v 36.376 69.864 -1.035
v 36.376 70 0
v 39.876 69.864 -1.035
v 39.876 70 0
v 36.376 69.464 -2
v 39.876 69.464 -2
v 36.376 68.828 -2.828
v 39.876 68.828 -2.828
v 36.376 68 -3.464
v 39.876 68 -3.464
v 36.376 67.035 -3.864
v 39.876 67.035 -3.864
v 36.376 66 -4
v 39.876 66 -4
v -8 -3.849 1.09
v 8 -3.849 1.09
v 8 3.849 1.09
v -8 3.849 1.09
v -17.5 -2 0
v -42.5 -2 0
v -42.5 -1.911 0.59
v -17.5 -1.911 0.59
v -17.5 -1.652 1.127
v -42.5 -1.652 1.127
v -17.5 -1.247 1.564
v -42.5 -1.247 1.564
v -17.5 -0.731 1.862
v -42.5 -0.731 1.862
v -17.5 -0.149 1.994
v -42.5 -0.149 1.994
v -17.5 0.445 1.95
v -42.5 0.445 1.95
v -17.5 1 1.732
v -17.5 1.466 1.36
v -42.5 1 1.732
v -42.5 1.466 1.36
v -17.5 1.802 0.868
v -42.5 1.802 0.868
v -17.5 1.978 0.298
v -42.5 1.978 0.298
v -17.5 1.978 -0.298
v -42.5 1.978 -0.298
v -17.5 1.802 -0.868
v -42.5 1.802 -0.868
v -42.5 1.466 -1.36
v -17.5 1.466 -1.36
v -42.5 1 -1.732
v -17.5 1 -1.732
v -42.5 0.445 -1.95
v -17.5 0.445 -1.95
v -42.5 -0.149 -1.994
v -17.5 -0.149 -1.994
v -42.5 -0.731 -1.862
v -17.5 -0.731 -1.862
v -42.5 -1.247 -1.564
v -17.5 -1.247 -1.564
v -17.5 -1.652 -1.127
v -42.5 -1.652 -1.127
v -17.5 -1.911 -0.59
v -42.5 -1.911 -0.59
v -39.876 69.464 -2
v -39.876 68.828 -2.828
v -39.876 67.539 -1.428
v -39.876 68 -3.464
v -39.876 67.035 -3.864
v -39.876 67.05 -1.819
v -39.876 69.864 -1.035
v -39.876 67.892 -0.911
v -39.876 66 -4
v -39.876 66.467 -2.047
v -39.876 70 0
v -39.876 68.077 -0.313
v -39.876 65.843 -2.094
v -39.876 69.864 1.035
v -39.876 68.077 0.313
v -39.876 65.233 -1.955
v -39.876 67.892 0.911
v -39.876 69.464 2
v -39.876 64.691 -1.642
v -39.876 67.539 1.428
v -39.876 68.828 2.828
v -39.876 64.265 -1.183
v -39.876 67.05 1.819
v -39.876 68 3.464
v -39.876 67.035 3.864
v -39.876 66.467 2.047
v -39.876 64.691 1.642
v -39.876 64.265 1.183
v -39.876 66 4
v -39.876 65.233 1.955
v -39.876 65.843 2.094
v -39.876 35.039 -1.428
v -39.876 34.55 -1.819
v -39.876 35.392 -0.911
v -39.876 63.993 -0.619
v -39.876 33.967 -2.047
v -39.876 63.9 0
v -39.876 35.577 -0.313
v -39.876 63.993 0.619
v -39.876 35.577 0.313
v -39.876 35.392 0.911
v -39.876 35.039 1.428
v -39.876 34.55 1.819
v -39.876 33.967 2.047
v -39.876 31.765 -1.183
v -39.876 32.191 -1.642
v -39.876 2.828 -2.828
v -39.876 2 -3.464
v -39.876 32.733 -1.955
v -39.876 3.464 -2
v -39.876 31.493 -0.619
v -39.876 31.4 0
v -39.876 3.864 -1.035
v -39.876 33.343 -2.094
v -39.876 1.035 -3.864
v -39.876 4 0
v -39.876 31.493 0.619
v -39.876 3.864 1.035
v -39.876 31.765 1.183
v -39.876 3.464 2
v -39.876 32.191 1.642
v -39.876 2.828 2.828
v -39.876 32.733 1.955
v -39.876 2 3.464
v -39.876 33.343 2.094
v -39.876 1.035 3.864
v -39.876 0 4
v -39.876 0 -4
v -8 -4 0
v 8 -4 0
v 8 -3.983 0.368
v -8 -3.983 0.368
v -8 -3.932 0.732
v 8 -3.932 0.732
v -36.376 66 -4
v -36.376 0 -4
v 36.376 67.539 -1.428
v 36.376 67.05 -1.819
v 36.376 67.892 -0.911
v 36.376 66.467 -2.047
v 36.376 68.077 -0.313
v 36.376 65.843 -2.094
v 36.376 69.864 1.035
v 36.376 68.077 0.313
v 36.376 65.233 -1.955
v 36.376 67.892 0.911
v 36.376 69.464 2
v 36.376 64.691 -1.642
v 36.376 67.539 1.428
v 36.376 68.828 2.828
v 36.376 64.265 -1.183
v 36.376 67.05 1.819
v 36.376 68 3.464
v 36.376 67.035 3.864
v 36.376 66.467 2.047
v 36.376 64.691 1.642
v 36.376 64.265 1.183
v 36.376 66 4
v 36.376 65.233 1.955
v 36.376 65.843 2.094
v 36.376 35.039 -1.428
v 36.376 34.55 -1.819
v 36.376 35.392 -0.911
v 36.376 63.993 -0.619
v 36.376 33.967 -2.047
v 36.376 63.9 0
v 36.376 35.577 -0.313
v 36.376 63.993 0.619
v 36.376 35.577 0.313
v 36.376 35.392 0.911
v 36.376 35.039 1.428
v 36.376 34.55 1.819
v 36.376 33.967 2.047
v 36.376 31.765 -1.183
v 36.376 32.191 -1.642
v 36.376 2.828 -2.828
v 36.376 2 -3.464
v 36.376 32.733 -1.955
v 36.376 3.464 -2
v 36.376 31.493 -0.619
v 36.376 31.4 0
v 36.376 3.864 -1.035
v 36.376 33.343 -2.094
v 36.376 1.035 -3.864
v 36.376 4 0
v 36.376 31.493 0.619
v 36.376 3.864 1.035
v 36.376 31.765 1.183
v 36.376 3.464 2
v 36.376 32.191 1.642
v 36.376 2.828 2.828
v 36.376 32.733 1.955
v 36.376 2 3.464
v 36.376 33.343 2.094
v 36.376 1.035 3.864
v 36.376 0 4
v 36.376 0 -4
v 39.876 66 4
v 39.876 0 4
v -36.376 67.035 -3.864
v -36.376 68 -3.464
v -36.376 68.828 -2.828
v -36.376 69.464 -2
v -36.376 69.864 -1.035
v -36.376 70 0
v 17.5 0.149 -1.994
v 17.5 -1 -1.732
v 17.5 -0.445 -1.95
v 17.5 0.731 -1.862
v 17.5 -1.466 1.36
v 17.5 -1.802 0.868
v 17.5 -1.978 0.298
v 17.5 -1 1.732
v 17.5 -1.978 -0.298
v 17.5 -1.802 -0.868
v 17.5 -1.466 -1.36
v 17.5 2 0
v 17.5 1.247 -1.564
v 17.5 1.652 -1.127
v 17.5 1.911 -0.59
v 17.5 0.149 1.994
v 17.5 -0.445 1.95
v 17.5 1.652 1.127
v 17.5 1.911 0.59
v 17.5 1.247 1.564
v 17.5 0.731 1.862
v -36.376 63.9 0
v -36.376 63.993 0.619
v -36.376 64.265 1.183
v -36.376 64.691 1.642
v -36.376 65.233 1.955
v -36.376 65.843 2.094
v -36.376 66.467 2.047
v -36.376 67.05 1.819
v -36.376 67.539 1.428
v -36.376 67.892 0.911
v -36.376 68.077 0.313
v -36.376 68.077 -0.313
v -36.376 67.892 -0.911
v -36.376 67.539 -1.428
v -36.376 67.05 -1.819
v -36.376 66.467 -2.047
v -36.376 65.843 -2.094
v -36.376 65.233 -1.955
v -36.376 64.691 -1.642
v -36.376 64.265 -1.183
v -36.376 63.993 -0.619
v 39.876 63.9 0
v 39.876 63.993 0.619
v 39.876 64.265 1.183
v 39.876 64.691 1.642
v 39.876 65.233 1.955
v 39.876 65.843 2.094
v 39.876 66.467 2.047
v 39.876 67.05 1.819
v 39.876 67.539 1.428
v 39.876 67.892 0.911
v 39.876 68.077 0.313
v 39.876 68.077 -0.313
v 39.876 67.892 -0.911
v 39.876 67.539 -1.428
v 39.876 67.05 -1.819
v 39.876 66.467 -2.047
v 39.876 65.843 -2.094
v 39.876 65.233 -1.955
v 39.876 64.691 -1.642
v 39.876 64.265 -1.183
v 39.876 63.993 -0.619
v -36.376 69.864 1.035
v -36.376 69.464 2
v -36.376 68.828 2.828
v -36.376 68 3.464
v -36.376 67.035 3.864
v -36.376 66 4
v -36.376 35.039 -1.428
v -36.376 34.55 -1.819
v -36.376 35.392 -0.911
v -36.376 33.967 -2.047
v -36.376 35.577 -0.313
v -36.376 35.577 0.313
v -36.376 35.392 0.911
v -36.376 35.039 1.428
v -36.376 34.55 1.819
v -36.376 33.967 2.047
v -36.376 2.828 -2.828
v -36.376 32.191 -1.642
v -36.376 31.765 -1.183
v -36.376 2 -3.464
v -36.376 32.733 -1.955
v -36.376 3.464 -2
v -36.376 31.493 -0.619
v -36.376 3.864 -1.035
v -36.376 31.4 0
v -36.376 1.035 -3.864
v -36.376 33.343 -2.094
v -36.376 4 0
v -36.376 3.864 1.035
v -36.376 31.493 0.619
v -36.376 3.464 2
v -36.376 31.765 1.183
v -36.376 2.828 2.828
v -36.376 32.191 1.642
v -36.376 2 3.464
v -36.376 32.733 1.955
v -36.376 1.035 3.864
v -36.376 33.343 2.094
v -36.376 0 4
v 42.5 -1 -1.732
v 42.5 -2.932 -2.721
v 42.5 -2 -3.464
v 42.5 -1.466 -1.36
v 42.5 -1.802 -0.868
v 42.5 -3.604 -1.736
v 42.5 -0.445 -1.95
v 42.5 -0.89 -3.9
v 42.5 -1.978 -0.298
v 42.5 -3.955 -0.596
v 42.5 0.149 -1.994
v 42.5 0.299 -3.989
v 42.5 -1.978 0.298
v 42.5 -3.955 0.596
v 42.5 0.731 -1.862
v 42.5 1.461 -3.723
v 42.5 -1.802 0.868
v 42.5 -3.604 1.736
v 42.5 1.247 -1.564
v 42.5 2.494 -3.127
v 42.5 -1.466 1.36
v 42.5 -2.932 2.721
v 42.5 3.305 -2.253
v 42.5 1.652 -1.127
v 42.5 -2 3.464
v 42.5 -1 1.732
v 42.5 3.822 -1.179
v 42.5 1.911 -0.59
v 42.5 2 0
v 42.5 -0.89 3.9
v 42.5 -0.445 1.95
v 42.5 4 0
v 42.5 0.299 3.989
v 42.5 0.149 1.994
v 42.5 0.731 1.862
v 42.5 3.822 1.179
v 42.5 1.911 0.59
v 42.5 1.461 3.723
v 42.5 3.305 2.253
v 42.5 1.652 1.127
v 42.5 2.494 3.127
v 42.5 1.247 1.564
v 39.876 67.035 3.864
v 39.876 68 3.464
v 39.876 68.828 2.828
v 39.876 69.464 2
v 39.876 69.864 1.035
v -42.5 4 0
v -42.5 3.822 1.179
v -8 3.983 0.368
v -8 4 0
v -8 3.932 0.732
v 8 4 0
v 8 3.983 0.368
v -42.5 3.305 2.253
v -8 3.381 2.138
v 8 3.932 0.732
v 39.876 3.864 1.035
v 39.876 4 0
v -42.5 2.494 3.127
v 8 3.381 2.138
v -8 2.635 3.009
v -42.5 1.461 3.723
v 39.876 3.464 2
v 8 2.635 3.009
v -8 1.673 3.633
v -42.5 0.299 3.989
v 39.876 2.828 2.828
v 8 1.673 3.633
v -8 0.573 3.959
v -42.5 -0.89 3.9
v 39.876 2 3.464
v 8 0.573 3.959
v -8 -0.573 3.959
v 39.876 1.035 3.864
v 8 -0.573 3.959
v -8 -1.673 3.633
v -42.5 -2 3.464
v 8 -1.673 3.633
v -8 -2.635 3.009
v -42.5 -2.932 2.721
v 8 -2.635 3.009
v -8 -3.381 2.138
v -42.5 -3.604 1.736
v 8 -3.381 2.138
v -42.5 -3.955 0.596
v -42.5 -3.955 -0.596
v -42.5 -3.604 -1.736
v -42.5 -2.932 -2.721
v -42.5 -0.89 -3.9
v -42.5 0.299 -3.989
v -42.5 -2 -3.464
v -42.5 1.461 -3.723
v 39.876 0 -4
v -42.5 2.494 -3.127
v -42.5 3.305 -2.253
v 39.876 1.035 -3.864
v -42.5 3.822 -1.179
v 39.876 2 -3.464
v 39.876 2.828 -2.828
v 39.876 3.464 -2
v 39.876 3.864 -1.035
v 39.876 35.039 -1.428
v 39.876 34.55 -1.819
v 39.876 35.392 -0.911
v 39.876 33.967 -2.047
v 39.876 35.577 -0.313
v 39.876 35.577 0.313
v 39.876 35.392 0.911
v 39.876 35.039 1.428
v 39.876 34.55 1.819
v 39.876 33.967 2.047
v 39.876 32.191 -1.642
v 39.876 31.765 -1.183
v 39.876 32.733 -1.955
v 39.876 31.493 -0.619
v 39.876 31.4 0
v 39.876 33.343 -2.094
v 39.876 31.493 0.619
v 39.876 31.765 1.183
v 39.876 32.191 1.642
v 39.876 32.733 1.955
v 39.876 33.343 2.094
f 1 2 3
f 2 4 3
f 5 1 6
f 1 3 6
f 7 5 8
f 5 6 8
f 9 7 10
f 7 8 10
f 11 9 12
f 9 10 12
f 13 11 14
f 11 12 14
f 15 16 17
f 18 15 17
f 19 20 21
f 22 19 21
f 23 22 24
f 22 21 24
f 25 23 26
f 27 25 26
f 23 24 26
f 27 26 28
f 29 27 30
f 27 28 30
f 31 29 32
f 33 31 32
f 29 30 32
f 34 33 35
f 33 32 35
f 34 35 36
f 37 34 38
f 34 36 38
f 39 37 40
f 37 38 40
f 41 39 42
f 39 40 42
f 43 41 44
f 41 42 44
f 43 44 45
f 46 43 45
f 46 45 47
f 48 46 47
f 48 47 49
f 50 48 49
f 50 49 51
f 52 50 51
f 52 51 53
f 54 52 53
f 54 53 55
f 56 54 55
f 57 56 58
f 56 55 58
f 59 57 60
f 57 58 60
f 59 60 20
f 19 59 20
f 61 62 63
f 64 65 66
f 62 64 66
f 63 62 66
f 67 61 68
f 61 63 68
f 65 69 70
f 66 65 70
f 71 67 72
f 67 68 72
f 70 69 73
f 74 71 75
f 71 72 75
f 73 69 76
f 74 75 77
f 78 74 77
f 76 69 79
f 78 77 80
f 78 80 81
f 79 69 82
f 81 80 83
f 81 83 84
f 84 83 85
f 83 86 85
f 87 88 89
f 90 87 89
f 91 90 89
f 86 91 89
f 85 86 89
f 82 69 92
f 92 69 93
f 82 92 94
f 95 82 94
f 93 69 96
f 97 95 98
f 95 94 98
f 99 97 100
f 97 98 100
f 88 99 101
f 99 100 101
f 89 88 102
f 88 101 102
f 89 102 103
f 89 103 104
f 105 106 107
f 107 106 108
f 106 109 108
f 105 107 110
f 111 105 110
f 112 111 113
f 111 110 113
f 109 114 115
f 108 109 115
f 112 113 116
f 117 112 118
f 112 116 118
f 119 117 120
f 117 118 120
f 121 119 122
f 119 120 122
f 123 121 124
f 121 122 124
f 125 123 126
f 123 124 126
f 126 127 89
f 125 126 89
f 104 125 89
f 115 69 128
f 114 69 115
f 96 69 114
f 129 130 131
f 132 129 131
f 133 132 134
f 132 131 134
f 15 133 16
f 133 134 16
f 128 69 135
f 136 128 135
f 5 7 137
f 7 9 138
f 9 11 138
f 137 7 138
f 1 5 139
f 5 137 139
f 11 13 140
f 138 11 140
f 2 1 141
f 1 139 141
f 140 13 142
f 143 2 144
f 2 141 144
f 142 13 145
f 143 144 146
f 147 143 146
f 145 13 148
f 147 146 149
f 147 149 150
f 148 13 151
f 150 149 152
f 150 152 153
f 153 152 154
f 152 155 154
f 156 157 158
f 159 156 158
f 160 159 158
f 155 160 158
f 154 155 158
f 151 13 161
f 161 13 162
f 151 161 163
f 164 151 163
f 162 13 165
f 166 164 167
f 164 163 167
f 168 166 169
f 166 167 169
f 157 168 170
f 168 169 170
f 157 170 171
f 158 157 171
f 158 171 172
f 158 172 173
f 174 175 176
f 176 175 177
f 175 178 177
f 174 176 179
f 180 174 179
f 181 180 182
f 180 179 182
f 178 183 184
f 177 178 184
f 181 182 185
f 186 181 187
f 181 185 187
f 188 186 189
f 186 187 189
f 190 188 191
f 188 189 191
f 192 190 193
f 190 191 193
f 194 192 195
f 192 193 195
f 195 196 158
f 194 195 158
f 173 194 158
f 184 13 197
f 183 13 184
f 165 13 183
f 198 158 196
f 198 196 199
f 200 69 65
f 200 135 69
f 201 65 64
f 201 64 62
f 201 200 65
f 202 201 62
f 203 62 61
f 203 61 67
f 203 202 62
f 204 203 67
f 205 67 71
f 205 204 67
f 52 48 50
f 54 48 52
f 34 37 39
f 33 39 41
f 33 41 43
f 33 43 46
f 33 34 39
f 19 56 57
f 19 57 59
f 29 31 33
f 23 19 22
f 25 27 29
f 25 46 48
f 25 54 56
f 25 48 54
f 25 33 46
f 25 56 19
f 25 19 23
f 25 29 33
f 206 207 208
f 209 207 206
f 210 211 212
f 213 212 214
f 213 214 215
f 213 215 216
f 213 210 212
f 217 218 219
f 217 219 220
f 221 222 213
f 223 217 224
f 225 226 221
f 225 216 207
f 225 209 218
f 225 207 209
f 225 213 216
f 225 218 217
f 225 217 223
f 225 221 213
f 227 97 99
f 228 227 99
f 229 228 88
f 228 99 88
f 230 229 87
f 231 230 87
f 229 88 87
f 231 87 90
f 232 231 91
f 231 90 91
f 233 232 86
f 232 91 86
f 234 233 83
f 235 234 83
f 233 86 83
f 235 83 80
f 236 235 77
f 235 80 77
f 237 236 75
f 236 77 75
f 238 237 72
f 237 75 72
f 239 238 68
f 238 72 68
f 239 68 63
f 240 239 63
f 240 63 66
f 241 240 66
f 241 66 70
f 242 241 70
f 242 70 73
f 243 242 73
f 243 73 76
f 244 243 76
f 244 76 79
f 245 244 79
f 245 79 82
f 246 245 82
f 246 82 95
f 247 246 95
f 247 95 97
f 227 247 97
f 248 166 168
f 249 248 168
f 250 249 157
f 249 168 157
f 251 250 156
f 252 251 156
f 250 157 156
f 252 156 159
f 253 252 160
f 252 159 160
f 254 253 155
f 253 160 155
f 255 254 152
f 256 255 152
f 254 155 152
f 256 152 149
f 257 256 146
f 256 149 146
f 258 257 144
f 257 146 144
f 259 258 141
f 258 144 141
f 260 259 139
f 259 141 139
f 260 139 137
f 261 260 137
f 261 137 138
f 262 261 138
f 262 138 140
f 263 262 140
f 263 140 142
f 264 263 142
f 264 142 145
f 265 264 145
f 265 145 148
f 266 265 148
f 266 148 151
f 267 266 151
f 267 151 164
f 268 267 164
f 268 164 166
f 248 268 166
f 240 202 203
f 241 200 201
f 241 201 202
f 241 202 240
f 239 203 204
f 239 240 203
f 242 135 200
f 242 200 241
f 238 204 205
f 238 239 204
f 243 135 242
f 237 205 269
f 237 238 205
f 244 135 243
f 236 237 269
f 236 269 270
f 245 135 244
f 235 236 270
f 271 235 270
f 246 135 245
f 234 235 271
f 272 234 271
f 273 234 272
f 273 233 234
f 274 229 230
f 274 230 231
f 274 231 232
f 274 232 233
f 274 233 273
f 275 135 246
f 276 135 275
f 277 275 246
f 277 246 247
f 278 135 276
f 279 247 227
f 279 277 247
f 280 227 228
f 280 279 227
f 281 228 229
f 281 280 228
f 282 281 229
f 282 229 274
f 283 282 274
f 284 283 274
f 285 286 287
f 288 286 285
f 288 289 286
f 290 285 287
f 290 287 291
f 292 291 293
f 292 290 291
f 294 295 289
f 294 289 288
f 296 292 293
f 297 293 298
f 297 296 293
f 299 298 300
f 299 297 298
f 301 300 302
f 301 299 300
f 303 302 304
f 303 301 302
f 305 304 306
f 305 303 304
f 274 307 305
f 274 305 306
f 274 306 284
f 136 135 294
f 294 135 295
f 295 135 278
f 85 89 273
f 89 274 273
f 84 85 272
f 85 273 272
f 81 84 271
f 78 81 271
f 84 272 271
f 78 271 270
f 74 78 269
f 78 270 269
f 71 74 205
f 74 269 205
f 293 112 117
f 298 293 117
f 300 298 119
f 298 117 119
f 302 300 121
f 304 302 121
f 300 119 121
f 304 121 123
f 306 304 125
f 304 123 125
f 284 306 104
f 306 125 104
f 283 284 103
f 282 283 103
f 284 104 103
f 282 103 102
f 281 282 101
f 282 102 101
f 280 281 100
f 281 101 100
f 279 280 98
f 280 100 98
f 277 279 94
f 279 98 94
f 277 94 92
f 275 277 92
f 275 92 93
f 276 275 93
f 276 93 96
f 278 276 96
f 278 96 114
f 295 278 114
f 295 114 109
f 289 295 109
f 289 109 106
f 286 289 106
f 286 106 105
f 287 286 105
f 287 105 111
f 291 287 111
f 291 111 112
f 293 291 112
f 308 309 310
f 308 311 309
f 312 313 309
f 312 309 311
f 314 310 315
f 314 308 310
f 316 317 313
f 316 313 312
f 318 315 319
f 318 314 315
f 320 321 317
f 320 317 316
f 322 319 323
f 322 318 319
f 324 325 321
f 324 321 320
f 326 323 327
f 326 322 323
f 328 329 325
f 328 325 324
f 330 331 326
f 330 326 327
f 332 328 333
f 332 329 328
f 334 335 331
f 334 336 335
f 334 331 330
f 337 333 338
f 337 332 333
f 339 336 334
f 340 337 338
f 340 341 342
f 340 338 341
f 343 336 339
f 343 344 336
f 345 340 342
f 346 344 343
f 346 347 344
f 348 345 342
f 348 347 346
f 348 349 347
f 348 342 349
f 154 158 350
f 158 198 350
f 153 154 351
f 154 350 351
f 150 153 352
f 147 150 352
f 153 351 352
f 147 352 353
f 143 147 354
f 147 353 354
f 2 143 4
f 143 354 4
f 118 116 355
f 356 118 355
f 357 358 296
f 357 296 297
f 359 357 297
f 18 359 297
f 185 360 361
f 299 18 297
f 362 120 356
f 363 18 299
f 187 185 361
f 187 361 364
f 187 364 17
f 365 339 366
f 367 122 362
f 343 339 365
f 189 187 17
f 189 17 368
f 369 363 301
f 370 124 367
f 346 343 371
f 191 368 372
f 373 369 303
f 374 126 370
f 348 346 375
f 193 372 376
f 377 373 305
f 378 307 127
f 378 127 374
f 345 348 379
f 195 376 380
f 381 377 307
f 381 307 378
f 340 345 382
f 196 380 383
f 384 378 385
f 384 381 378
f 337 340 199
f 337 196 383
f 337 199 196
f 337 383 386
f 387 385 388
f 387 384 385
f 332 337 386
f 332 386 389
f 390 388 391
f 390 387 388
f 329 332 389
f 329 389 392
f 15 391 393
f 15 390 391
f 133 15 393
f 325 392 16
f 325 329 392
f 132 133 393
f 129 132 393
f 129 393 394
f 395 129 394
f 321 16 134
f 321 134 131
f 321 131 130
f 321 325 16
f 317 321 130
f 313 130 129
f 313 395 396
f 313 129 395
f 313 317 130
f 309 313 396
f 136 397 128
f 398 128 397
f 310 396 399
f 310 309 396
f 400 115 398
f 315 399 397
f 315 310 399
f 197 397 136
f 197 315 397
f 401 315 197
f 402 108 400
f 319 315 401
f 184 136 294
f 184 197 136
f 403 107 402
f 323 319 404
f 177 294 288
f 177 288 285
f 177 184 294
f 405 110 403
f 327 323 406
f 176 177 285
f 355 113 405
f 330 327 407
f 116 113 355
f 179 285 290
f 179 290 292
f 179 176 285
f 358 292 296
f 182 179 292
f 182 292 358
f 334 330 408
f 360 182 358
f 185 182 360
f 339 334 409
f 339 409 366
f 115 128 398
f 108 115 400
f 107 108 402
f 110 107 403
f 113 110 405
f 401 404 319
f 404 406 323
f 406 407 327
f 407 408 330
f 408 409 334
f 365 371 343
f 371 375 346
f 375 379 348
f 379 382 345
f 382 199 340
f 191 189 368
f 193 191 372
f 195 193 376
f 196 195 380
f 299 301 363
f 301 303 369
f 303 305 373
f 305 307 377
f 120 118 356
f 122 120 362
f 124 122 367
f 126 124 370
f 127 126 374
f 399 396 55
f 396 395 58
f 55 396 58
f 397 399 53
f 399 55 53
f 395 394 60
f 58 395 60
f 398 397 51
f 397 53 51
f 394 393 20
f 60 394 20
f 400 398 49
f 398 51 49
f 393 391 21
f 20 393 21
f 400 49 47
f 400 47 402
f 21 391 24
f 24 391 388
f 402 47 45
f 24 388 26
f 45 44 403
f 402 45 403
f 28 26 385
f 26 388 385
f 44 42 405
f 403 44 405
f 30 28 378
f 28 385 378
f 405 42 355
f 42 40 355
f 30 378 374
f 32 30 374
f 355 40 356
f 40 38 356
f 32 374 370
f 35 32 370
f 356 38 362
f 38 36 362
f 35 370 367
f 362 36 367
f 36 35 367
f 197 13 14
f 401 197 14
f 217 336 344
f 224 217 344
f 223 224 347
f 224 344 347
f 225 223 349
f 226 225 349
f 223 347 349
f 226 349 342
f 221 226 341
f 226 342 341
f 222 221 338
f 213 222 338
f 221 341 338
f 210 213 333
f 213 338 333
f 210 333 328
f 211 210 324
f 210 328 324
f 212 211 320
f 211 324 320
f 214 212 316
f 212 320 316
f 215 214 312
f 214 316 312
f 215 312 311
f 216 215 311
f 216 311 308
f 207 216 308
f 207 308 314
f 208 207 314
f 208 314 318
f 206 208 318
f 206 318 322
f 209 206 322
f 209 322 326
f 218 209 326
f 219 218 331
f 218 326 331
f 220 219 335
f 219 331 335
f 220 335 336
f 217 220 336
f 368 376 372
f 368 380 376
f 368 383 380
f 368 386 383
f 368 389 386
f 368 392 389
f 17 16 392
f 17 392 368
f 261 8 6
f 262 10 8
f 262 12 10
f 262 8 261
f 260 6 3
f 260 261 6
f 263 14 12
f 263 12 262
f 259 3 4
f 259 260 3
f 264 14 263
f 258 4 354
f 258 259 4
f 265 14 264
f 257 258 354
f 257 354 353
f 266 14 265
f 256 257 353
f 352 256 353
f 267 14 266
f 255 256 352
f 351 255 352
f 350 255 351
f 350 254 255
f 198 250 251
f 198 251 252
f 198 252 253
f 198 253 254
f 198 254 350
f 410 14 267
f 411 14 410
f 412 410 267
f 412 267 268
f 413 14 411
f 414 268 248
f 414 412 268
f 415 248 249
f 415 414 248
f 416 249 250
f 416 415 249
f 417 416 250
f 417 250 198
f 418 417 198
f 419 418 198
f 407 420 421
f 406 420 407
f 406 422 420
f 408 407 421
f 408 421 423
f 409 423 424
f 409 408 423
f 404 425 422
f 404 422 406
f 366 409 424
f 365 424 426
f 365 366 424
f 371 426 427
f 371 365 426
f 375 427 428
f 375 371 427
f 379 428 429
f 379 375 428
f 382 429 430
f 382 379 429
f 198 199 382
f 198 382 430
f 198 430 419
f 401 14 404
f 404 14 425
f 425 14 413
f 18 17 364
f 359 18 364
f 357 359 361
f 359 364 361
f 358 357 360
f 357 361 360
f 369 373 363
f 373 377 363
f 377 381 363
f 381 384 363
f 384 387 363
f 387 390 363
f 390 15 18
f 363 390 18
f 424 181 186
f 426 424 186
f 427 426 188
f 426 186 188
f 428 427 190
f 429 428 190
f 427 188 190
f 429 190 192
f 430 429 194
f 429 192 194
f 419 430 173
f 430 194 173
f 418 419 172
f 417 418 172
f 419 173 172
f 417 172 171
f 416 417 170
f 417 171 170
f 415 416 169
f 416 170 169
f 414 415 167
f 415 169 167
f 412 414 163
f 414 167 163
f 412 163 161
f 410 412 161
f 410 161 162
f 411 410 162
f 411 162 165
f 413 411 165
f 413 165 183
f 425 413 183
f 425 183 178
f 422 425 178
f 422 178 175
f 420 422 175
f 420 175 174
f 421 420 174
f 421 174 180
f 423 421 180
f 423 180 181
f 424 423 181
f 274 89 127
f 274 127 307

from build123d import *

# Parameters (mm, degrees)
F0_R          = 4
F1_DEPTH      = 42.5
F1_DEPTH_BACK = 42.5
F2_W          = 8
F2_H          = 8
F3_DEPTH      = 25
F4_W          = 3.5
F4_H          = 8
F5_DEPTH      = 70
F6_R          = 2
F7_DEPTH      = 25
F8_R          = 2
F9_DEPTH      = 25
F10_R         = 3.99999
F11_R         = 2.1
F12_DEPTH     = 82.3766380975
F14_DEPTH     = 16


# Not quite as in the source:
# - a fillet or chamfer is up to 0.001 mm smaller than in the source, because OpenCascade refuses the exact size


with BuildPart() as f1:
    # F0 (on Right) → F1 (new body, two sides)
    with BuildSketch(Plane.YZ) as f1_sk:
        Circle(F0_R)
    extrude(amount=F1_DEPTH)
    extrude(f1_sk.sketch, amount=-F1_DEPTH_BACK)

    # F2 (on Top) → F3 (cut)
    with BuildSketch(Plane.XY):
        with Locations((-4, 0)):
            Rectangle(F2_W, F2_H)
        with Locations((4, 0)):
            Rectangle(F2_W, F2_H)
    extrude(amount=F3_DEPTH, mode=Mode.SUBTRACT)

    # F4 (on Front) → F5 (join)
    with BuildSketch(Plane.XZ):
        with Locations((38.1256380975, 0)):
            Rectangle(F4_W, F4_H)
        with Locations((-38.1256380975, 0)):
            Rectangle(F4_W, F4_H)
    extrude(amount=-F5_DEPTH)

    # F6 (on face) → F7 (cut)
    with BuildSketch(Plane.YZ.offset(42.5)):
        Circle(F6_R)
    extrude(amount=-F7_DEPTH, mode=Mode.SUBTRACT)

    # F8 (on face) → F9 (cut)
    with BuildSketch(Plane(origin=(-42.5, 0, 0), x_dir=(0, -1, 0), z_dir=(-1, 0, 0))):
        Circle(F8_R)
    extrude(amount=-F9_DEPTH, mode=Mode.SUBTRACT)

    # F10 (radius 4 in the source; OpenCascade refuses exactly that, so slightly less here)
    f10_edges = [f1.edges().sort_by_distance(p)[0] for p in [
        (38.125638, 70, 4),
        (38.125638, 70, -4),
        (-38.125638, 70, 4),
        (-38.125638, 70, -4),
    ]]
    fillet(f10_edges, radius=F10_R)

    # F11 (on face) → F12 (cut, through all)
    with BuildSketch(Plane(origin=(-39.8756380975, 0, 0), x_dir=(0, -1, 0), z_dir=(-1, 0, 0))):
        with Locations((-66, 0)):
            Circle(F11_R)
        with Locations((-33.5, 0)):
            Circle(F11_R)
    extrude(amount=-F12_DEPTH, mode=Mode.SUBTRACT)

    # F13 (on face) → F14 (join, through all)
    with BuildSketch(Plane(origin=(8, 0, 0), x_dir=(0, -1, 0), z_dir=(-1, 0, 0))):
        with BuildLine():
            ThreePointArc((-3.848557921, 1.0902302184), (-3.9619585866, 0.5503491238), (-4, 0))
            Line((-4, 0), (4, 0))
            ThreePointArc((4, 0), (3.9619585866, 0.5503491238), (3.848557921, 1.0902302184))
            Line((3.848557921, 1.0902302184), (-3.848557921, 1.0902302184))
        make_face()
    extrude(amount=F14_DEPTH)


solid = f1.part
